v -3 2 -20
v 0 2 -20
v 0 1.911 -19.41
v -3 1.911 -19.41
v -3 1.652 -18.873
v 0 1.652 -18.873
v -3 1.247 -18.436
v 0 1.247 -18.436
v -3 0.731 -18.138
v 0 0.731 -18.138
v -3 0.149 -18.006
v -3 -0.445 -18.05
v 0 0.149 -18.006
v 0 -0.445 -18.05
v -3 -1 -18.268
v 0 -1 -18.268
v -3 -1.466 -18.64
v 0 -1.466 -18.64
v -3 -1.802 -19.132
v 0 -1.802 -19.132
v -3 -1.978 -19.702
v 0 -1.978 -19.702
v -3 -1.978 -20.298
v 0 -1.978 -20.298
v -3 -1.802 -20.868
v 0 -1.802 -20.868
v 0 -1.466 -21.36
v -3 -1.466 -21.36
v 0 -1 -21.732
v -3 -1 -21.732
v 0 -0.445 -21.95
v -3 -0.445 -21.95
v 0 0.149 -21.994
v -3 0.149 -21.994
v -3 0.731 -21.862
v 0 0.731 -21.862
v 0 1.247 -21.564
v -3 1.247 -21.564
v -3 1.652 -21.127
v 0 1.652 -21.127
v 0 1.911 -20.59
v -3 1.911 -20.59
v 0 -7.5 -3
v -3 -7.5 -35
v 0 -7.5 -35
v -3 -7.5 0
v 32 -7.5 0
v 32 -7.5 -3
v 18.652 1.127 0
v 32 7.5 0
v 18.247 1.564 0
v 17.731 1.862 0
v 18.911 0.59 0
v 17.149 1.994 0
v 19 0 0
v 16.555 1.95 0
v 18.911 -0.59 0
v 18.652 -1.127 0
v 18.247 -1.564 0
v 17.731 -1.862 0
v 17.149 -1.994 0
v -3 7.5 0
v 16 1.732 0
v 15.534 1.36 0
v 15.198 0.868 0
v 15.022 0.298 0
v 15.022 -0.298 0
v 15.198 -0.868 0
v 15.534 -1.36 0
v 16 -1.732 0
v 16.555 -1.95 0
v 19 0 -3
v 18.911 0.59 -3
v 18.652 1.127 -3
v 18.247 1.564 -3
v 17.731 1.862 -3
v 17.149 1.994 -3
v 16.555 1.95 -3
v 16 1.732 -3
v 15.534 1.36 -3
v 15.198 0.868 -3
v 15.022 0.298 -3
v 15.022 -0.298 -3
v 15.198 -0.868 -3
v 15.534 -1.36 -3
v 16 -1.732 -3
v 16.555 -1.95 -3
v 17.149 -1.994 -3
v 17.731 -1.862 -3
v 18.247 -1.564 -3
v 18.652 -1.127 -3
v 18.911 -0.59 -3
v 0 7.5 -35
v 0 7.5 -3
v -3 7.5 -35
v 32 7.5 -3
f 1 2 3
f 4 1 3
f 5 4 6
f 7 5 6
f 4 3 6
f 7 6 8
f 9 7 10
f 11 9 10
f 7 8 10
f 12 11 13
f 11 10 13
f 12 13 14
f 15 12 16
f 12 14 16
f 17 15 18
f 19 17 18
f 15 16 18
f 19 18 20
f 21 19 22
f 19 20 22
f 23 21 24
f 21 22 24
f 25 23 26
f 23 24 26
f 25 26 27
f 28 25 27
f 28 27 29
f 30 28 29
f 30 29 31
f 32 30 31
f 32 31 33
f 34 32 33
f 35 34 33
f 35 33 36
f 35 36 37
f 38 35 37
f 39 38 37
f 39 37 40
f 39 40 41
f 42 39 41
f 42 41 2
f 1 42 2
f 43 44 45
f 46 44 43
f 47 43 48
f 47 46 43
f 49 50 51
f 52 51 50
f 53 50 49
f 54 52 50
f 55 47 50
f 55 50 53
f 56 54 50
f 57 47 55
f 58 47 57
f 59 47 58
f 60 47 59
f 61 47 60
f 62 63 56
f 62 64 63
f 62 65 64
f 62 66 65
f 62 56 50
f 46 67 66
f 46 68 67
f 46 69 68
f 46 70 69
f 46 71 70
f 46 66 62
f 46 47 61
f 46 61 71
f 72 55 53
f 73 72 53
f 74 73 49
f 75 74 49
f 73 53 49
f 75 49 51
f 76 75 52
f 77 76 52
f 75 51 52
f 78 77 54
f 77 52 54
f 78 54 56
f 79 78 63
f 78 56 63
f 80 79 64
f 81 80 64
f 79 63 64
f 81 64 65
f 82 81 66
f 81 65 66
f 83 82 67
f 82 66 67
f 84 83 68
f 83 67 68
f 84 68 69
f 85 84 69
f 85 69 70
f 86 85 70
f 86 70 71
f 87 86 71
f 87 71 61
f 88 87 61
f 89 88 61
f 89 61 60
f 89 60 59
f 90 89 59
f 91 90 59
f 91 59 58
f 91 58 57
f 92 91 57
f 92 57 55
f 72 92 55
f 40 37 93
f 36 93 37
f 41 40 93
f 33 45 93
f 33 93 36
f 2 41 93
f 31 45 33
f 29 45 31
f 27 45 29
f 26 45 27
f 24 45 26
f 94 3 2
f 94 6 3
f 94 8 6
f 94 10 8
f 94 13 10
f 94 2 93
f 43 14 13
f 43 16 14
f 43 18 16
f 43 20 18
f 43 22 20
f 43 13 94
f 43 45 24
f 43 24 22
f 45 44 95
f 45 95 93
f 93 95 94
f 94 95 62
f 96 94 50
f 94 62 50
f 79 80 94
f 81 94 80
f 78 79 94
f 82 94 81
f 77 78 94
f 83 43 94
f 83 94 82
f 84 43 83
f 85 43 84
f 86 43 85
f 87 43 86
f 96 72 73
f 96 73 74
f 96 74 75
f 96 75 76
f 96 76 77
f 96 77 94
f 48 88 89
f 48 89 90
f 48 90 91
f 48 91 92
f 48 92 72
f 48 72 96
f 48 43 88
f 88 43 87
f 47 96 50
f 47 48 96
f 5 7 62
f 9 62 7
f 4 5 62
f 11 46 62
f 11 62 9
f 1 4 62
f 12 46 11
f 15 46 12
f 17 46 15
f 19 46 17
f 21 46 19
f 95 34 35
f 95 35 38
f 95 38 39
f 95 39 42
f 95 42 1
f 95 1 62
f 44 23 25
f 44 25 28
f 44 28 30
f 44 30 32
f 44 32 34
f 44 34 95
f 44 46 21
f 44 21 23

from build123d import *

# Parameters (mm, degrees)
F0_W     = 3
F0_H     = 3
F0_W_2   = 32
F0_H_2   = 32
F1_DEPTH = 7.5
F2_R     = 2
F3_DEPTH = 3.001
F4_R     = 2
F5_DEPTH = 35.001


with BuildPart() as f1:
    # F0 (on Front) → F1 (new body, symmetric)
    with BuildSketch(Plane.XZ):
        with Locations((-1.5, -1.5)):
            Rectangle(F0_W, F0_H)
        with Locations((16, -1.5)):
            Rectangle(F0_W_2, F0_H)
        with Locations((-1.5, -19)):
            Rectangle(F0_W, F0_H_2)
    extrude(amount=F1_DEPTH, both=True)

    # F2 (on face) → F3 (cut, through all)
    with BuildSketch(Plane.YZ):
        with Locations((0, -20)):
            Circle(F2_R)
    extrude(amount=-F3_DEPTH, mode=Mode.SUBTRACT)

    # F4 (on face) → F5 (cut, through all)
    with BuildSketch(Plane.XY):
        with Locations((17, 0)):
            Circle(F4_R)
    extrude(amount=-F5_DEPTH, mode=Mode.SUBTRACT)


solid = f1.part
